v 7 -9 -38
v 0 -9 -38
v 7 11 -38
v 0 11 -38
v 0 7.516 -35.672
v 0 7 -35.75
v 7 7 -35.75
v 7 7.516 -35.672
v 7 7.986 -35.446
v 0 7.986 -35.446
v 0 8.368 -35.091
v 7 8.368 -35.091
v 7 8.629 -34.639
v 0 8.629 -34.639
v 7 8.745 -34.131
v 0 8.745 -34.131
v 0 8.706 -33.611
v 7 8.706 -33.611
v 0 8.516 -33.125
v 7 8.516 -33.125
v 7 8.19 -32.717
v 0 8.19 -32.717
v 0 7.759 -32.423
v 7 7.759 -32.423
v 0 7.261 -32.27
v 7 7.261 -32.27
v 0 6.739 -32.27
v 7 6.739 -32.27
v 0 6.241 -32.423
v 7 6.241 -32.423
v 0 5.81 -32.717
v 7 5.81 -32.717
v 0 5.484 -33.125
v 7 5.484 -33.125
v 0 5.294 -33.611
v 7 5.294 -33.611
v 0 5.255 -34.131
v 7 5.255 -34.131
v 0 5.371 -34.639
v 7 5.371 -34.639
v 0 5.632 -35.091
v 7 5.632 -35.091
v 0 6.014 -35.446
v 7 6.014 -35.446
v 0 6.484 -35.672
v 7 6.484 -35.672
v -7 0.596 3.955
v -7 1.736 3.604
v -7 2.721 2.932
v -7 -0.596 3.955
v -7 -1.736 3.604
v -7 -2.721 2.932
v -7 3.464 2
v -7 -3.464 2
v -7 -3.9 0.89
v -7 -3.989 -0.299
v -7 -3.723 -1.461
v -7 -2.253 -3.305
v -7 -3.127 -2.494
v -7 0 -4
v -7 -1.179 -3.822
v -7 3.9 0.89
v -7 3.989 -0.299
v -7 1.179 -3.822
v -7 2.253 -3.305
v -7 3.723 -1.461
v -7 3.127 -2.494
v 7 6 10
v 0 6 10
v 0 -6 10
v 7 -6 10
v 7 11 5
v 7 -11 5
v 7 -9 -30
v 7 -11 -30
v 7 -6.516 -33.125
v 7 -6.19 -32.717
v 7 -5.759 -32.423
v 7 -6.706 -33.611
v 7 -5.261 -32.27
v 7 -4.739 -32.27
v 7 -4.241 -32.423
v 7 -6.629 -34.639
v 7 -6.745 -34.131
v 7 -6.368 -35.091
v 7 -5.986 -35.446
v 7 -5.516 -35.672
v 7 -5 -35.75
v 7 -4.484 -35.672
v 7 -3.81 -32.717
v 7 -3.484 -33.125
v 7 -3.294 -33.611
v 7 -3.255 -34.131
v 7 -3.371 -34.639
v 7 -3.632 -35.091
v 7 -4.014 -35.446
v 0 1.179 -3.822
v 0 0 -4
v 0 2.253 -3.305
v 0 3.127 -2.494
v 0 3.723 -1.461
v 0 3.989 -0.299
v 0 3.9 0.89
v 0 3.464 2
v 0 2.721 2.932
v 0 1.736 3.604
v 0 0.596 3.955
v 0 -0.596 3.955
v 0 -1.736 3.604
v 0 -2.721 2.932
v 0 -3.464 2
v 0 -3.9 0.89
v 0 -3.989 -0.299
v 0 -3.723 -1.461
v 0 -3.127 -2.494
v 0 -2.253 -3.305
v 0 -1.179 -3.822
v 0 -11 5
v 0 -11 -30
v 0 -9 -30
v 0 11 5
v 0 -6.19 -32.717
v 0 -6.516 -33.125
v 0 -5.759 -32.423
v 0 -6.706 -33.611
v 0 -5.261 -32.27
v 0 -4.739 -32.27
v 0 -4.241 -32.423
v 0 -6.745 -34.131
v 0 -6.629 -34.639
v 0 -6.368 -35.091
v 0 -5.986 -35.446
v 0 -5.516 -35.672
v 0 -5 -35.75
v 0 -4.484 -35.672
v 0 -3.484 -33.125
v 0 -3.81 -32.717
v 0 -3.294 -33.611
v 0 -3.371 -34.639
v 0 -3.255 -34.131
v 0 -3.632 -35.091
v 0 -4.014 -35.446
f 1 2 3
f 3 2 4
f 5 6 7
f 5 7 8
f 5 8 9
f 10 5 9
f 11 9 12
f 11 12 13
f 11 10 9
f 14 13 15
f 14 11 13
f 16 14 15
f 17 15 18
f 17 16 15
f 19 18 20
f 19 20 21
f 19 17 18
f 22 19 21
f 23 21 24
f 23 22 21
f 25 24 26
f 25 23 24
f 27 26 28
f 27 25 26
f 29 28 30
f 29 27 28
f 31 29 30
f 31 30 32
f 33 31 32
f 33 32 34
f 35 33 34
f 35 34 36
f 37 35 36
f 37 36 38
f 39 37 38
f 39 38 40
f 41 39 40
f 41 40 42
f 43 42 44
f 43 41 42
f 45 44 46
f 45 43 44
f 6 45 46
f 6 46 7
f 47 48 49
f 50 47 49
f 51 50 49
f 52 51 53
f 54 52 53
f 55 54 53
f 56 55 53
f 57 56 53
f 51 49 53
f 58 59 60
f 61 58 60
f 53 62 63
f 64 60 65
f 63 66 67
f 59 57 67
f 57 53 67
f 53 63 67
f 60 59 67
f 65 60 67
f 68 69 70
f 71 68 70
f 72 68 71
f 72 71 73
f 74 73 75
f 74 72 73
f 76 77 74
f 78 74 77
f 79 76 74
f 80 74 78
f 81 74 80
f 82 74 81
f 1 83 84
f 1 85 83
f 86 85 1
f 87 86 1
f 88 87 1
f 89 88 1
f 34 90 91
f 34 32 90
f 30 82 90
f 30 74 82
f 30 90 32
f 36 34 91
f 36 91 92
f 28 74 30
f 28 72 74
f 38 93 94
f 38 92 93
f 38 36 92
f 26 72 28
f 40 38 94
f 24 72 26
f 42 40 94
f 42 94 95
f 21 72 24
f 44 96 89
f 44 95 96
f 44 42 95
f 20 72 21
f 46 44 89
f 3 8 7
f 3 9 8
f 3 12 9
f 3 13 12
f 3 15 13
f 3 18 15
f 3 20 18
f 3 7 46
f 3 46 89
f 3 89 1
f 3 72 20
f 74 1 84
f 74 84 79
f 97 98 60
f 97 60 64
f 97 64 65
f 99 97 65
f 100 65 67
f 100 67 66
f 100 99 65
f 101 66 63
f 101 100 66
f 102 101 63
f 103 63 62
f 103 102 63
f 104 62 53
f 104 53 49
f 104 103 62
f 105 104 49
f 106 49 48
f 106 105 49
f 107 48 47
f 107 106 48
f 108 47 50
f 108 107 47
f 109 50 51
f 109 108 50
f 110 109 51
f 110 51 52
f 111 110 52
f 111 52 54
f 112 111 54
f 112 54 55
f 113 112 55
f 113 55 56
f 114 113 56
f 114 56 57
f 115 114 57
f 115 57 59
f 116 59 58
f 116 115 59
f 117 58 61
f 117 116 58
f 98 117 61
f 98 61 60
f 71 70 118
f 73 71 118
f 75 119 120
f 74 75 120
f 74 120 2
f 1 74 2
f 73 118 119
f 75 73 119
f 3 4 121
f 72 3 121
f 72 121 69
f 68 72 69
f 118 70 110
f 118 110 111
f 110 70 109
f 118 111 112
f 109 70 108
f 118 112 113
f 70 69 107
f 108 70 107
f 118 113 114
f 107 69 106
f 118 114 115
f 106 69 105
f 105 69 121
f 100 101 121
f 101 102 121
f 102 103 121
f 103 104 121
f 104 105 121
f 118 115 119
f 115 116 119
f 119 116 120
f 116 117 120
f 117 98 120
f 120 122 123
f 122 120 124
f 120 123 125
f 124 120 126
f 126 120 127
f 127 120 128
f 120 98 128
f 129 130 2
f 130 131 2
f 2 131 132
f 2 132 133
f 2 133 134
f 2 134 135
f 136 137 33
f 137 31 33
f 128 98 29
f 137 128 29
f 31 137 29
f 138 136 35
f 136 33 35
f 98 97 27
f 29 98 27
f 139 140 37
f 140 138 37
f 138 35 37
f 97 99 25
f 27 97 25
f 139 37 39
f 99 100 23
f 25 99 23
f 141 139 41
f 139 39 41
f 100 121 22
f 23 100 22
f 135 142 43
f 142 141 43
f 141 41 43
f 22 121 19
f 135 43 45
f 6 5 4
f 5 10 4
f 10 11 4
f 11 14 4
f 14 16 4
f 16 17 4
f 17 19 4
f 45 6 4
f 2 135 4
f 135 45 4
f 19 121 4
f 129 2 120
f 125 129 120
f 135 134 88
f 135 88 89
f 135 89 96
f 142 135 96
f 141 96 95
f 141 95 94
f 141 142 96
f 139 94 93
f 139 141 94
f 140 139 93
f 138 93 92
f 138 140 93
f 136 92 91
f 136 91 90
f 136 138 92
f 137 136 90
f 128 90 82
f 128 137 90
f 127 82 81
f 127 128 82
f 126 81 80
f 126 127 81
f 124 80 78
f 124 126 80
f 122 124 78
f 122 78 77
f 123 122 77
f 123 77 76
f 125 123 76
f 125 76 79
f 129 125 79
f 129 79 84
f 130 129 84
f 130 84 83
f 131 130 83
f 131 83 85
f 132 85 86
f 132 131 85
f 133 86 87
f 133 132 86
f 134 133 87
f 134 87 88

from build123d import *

# Parameters (mm, degrees)
SKETCH1_R               = 1.75
BOSS_EXTRUDE1_DEPTH     = 7
SKETCH1_4_R             = 4
BOSS_EXTRUDE2_DEPTH     = 7
CUT_EXTRUDE1_DEPTH      = 92.744209627
CUT_EXTRUDE1_DEPTH_BACK = 92.744209627
SKETCH2_W               = 104
SKETCH2_H               = 76.59410066


with BuildPart() as part:
    # Sketch1 → Boss-Extrude1 (new body)
    with BuildSketch(Plane(origin=(0, 0, 0), x_dir=(0, 0, -1), z_dir=(1, 0, 0))):
        Polygon((90, 11), (-5, 11), (-10, 6), (-10, -6), (-5, -11), (30, -11), (30, -9), (90, -9), align=None)
        with Locations((34, -5)):
            Circle(SKETCH1_R, mode=Mode.SUBTRACT)
        with BuildLine():
            ThreePointArc((64, -6.75), (62.25, -5), (64, -3.25))
            Line((64, -3.25), (66, -3.25))
            ThreePointArc((66, -3.25), (67.75, -5), (66, -6.75))
            Line((66, -6.75), (64, -6.75))
        make_face(mode=Mode.SUBTRACT)
        with Locations((34, 7)):
            Circle(SKETCH1_R, mode=Mode.SUBTRACT)
        with BuildLine():
            ThreePointArc((45, 3.25), (43.25, 5), (45, 6.75))
            Line((45, 6.75), (47, 6.75))
            ThreePointArc((47, 6.75), (48.75, 5), (47, 3.25))
            Line((47, 3.25), (45, 3.25))
        make_face(mode=Mode.SUBTRACT)
        with BuildLine():
            ThreePointArc((85, 6.75), (86.75, 5), (85, 3.25))
            Line((85, 3.25), (83, 3.25))
            ThreePointArc((83, 3.25), (81.25, 5), (83, 6.75))
            Line((83, 6.75), (85, 6.75))
        make_face(mode=Mode.SUBTRACT)
    extrude(amount=BOSS_EXTRUDE1_DEPTH)

    # Sketch1<4> → Boss-Extrude2 (add)
    with BuildSketch(Plane(origin=(0, 0, 0), x_dir=(0, 0, -1), z_dir=(1, 0, 0))):
        Circle(SKETCH1_4_R)
    extrude(amount=-BOSS_EXTRUDE2_DEPTH)

    # Sketch2 → Cut-Extrude1 (cut, two sides: drawn at the far end of the back side and taken through both)
    with BuildSketch(Plane(origin=(7, 0, 0), x_dir=(0, 0, -1), z_dir=(1, 0, 0)).offset(-CUT_EXTRUDE1_DEPTH_BACK)):
        with Locations((90, -9)):
            Rectangle(SKETCH2_W, SKETCH2_H)
    extrude(amount=CUT_EXTRUDE1_DEPTH + CUT_EXTRUDE1_DEPTH_BACK, mode=Mode.SUBTRACT)


solid = part.part
